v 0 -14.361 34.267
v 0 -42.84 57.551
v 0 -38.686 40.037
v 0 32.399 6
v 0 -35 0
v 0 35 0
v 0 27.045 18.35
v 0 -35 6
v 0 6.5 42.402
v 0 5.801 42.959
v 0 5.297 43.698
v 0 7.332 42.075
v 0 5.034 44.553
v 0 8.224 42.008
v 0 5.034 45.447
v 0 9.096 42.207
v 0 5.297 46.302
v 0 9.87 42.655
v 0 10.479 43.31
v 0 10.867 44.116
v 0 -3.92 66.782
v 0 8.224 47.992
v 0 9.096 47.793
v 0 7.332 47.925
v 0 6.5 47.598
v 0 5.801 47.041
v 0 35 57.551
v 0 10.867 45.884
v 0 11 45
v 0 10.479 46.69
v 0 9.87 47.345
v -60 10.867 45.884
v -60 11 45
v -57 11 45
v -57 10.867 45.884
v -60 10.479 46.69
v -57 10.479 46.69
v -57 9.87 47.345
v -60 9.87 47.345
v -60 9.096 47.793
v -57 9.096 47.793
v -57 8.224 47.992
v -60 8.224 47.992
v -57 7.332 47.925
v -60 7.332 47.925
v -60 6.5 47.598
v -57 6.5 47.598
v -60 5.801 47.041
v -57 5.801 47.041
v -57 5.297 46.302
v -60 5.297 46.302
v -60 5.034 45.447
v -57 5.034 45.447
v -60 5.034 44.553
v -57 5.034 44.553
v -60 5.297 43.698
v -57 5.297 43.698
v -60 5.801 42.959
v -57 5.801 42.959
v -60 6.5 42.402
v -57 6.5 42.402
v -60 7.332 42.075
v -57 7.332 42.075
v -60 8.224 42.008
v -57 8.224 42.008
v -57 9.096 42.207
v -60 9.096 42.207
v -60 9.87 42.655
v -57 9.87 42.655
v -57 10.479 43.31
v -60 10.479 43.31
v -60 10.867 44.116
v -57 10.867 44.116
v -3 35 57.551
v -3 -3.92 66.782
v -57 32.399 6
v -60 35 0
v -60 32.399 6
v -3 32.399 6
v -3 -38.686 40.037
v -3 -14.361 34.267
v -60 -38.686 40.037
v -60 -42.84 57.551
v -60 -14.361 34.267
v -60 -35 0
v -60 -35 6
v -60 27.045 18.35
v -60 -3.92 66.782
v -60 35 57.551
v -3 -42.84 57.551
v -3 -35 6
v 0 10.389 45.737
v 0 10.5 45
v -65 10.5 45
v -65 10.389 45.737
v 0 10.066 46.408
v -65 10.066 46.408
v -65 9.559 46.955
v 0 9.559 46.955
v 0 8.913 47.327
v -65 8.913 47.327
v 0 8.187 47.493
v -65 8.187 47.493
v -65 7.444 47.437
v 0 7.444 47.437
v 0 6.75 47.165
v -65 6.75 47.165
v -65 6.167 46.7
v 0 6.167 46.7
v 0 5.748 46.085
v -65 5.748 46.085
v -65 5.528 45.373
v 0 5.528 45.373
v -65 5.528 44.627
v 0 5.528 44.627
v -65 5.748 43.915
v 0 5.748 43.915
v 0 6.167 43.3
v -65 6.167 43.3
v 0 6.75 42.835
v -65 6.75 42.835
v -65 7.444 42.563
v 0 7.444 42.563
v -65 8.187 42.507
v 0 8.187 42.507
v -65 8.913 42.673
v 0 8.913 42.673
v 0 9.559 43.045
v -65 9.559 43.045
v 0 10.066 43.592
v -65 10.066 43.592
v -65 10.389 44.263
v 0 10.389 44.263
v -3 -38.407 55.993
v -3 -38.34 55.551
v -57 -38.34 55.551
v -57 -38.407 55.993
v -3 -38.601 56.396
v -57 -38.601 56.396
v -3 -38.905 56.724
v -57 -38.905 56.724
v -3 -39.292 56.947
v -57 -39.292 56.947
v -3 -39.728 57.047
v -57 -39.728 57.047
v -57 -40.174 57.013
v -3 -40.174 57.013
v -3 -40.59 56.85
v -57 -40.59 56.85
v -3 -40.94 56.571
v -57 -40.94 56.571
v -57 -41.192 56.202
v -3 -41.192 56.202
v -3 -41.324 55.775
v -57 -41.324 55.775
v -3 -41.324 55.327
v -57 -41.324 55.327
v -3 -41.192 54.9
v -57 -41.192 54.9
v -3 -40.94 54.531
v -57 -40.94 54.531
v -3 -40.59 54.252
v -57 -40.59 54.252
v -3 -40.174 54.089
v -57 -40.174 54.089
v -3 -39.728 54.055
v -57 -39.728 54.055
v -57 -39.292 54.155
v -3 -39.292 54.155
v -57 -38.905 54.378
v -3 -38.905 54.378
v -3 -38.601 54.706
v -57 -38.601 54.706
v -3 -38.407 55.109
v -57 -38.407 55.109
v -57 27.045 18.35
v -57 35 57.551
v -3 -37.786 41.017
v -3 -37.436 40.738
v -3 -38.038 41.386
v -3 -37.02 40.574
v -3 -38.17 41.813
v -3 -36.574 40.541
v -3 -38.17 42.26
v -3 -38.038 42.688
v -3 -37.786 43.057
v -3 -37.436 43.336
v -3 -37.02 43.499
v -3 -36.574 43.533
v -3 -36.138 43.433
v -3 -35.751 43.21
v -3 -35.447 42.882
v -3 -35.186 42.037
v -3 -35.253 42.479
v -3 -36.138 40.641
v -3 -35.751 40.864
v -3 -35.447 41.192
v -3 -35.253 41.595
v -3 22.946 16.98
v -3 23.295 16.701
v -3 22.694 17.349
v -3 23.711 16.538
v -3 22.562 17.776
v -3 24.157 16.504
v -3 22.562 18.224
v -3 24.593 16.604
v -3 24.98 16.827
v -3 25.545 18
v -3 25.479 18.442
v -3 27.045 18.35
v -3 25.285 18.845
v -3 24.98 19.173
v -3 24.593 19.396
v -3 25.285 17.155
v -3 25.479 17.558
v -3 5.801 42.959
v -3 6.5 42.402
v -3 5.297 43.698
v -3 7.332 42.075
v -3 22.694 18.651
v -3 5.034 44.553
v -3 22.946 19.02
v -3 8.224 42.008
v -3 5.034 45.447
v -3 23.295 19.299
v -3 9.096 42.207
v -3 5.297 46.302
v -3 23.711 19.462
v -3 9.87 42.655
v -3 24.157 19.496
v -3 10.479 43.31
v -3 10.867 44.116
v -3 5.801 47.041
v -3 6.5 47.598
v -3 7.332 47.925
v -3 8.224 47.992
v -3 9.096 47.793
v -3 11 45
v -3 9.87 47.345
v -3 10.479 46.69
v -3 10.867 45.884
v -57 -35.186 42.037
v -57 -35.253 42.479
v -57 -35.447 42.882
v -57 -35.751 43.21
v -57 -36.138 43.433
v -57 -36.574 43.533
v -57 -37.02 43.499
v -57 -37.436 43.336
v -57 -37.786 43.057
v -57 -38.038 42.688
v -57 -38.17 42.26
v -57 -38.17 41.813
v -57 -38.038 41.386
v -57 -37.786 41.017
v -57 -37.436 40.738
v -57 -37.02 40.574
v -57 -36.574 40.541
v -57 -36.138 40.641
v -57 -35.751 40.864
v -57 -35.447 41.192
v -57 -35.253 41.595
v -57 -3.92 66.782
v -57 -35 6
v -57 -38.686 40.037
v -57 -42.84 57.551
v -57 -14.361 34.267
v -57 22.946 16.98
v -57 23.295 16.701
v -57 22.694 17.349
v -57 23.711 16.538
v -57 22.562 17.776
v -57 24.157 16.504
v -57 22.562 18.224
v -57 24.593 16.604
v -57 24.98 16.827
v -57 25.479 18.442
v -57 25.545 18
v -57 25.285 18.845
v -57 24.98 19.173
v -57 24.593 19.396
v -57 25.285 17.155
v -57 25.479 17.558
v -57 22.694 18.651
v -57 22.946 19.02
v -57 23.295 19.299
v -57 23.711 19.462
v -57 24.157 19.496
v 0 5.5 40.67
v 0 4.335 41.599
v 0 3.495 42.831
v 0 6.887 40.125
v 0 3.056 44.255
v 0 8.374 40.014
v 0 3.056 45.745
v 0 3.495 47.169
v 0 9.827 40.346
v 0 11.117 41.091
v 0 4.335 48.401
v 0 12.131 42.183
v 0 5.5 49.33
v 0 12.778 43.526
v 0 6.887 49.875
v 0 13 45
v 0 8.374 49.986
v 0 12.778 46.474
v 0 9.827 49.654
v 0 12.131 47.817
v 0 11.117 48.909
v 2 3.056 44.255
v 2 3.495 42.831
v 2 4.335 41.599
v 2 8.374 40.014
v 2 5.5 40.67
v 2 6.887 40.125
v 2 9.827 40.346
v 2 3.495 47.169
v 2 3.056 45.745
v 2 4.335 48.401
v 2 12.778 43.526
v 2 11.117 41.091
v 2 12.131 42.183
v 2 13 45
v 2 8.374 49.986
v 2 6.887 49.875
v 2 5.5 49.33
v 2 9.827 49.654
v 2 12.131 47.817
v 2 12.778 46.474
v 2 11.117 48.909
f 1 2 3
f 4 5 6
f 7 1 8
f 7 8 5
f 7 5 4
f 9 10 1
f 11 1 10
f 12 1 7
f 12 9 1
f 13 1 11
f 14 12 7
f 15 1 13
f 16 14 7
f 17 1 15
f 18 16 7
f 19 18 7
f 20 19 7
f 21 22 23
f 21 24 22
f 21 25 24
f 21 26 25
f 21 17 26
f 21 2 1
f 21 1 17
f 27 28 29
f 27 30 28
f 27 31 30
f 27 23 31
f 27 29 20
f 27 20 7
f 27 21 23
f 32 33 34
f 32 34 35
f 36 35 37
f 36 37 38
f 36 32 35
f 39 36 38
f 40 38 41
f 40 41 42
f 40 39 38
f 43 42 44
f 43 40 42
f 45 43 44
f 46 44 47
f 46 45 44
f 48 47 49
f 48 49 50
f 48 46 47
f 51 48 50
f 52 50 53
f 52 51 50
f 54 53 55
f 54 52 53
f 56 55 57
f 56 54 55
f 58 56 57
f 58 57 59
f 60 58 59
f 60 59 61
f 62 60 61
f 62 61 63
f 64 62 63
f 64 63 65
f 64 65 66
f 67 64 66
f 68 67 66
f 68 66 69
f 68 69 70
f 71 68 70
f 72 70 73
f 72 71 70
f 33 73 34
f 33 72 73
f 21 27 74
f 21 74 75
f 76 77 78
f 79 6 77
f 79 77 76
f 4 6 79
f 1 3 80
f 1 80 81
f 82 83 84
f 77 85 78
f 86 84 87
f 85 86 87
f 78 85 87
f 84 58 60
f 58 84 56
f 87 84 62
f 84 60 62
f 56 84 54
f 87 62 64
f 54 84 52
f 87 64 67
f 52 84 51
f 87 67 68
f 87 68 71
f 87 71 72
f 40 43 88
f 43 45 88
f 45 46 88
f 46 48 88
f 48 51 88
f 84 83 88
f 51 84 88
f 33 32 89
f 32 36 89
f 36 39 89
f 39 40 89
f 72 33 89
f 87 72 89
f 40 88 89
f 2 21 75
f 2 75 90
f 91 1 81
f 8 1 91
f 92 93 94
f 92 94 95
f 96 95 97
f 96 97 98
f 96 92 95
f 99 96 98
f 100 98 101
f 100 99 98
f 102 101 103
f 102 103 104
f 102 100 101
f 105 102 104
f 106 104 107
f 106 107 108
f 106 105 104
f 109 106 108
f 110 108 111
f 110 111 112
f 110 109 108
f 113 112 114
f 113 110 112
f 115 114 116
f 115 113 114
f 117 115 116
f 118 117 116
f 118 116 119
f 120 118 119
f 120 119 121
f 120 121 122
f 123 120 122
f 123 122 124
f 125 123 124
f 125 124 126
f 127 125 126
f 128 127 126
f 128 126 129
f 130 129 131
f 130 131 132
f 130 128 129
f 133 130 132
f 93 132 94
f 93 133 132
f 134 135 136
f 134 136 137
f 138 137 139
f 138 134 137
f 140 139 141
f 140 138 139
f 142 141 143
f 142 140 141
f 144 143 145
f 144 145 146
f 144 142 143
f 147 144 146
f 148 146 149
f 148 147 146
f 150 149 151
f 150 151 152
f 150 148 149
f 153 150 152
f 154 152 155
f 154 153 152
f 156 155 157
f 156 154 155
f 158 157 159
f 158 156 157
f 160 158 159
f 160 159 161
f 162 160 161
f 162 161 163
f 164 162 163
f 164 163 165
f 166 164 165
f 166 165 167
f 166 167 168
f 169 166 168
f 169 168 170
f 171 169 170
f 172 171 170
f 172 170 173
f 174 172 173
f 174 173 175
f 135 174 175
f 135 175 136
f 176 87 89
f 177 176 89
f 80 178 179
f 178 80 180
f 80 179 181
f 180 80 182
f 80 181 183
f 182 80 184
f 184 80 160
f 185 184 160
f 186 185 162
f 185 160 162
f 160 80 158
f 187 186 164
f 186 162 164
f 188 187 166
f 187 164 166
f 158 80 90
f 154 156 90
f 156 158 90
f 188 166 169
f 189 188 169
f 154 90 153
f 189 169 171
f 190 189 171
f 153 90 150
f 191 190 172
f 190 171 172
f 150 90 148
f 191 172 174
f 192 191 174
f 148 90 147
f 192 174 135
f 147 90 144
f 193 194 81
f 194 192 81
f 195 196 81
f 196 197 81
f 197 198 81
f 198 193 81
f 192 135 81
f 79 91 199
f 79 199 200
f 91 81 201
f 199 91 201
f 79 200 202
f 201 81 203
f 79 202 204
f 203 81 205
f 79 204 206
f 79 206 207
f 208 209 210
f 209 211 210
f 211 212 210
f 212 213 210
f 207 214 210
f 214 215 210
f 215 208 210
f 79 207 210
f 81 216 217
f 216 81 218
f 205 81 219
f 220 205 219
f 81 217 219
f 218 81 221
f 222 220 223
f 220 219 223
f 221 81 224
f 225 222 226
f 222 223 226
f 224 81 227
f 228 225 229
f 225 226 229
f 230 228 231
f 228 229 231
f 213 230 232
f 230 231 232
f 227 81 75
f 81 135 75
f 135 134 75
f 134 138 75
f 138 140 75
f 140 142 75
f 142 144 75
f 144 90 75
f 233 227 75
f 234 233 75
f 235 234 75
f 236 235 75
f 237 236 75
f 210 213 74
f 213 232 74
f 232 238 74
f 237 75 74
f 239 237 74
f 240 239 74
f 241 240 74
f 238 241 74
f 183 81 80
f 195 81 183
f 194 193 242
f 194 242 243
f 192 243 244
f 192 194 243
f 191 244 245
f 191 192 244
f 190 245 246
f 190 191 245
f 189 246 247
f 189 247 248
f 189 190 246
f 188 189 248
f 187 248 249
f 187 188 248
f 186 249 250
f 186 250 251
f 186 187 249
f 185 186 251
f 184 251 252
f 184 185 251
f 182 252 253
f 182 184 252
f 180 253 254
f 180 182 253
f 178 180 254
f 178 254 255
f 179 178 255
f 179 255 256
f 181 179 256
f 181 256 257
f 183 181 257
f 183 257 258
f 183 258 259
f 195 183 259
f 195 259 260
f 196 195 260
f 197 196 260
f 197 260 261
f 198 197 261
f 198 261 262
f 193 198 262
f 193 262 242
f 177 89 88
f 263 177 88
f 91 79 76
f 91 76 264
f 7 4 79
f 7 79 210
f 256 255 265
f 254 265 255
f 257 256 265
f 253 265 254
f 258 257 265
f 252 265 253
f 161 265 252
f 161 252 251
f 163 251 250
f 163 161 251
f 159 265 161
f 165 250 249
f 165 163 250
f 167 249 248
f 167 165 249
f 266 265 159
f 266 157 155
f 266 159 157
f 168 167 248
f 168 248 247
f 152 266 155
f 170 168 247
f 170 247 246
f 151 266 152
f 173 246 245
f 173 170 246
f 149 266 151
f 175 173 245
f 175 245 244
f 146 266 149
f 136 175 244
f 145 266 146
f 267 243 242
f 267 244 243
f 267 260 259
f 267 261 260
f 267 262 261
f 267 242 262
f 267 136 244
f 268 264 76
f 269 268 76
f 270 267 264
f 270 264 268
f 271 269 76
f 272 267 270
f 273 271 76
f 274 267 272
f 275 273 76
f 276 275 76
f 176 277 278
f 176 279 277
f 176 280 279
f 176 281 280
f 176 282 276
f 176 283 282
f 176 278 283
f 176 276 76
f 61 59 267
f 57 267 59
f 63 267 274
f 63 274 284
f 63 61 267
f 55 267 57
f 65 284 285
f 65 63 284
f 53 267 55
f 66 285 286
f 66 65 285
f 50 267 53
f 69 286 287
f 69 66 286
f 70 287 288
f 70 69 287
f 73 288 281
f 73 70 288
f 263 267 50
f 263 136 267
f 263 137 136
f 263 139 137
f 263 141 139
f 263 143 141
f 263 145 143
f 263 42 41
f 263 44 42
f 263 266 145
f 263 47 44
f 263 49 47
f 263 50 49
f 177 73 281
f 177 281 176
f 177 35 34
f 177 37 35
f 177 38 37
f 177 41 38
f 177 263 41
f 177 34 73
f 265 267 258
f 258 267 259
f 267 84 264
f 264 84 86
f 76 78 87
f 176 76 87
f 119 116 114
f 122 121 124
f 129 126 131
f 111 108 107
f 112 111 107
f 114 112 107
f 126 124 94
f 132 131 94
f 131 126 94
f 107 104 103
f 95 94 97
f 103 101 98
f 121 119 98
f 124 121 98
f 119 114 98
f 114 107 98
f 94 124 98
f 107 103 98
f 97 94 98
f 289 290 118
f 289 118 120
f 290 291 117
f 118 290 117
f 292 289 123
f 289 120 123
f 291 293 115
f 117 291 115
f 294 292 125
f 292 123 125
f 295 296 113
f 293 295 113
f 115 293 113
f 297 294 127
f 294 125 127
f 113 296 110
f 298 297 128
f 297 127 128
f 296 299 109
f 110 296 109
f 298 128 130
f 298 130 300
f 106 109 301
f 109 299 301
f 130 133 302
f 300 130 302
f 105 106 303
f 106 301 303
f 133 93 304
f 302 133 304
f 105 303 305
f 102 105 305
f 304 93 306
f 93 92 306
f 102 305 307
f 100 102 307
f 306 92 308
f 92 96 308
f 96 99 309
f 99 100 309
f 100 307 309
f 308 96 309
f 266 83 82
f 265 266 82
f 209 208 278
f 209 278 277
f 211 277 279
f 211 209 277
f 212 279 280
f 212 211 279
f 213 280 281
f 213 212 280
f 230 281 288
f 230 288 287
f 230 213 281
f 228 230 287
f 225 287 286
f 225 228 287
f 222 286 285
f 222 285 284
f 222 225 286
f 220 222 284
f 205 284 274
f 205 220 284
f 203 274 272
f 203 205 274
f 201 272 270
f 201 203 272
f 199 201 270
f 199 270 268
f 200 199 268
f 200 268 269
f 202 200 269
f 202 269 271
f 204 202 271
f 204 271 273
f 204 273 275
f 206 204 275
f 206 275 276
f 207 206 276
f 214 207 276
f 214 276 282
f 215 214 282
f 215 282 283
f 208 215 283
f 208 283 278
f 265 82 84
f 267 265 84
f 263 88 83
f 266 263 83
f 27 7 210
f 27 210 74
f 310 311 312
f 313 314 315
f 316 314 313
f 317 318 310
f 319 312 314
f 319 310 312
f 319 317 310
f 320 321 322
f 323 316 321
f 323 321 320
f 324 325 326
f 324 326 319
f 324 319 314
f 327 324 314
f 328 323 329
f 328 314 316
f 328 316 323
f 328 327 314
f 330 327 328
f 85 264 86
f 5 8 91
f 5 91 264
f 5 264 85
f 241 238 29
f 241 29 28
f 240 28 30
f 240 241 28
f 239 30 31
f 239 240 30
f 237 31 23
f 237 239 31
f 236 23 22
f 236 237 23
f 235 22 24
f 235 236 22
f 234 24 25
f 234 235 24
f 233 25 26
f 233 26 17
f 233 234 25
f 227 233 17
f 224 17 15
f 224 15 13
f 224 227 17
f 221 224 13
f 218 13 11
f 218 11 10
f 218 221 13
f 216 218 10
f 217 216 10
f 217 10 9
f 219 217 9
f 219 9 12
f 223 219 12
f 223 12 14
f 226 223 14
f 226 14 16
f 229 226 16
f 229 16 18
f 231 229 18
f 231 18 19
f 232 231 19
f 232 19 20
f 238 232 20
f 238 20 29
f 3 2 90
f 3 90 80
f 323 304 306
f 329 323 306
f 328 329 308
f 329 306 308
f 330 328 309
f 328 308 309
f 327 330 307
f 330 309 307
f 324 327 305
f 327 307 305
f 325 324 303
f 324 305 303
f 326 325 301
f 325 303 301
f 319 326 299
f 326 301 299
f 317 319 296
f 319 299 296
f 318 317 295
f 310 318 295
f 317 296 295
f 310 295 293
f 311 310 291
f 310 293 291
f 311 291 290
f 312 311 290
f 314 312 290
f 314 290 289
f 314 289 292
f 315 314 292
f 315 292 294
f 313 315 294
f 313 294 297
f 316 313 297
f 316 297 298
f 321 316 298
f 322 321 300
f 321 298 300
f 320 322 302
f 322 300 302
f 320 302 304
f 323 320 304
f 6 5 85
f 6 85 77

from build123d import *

# Parameters (mm, degrees)
F1_DEPTH  = 60
F2_DEPTH  = 3
F4_R      = 3
F5_DEPTH  = 3
F6_DEPTH  = 60
F7_R      = 1.5
F8_DEPTH  = 60
F9_R      = 1.5
F10_DEPTH = 60
F11_R     = 2.5
F12_DEPTH = 65
F11_R_2   = 5
F13_DEPTH = 2


with BuildPart() as f1:
    # F0 (on Right) → F1 (new body)
    with BuildSketch(Plane.YZ):
        Polygon((-35, 6), (-35, 0), (35, 0), (32.3989484852, 6), align=None)
    extrude(amount=-F1_DEPTH)

    # F0 (on Right) → F2 (join)
    with BuildSketch(Plane.YZ):
        Polygon((-14.361242862, 34.2673257278), (-35, 6), (32.3989484852, 6), (27.0451438645, 18.3499390697), (35, 57.5509628301), (-3.9202245884, 66.7822204902), (-42.8404491768, 57.5509628301), (-38.6863832298, 40.0368617653), align=None)
    extrude(amount=-F2_DEPTH)

    # F4 (on offset) → F5 (join)
    with BuildSketch(Plane.YZ.offset(-60)):
        Polygon((-38.6863832298, 40.0368617653), (-14.361242862, 34.2673257278), (-35, 6), (32.3989484852, 6), (27.0451438645, 18.3499390697), (35, 57.5509628301), (-3.9202245884, 66.7822204902), (-42.8404491768, 57.5509628301), align=None)
        with Locations((8, 45)):
            Circle(F4_R, mode=Mode.SUBTRACT)
    extrude(amount=F5_DEPTH)

    # F4 (on offset) → F6 (cut)
    with BuildSketch(Plane.YZ.offset(-60)):
        with Locations((8, 45)):
            Circle(F4_R)
    extrude(amount=F6_DEPTH, mode=Mode.SUBTRACT)

    # F7 (on Right) → F8 (join)
    with BuildSketch(Plane.YZ):
        with Locations((-39.8404491768, 55.5509628301)):
            Circle(F7_R)
        with Locations((-36.6863832298, 42.0368617653)):
            Circle(F7_R)
    extrude(amount=-F8_DEPTH)

    # F9 (on Right) → F10 (join)
    with BuildSketch(Plane.YZ):
        with Locations((24.0451438645, 18)):
            Circle(F9_R)
    extrude(amount=-F10_DEPTH)


with BuildPart() as f12:
    # F11 (on Right) → F12 (new body)
    with BuildSketch(Plane.YZ):
        with Locations((8, 45)):
            Circle(F11_R)
    extrude(amount=-F12_DEPTH)

    # F11 (on Right) → F13 (join)
    with BuildSketch(Plane.YZ):
        with Locations((8, 45)):
            Circle(F11_R_2)
        with Locations((8, 45)):
            Circle(F11_R, mode=Mode.SUBTRACT)
        with Locations((8, 45)):
            Circle(F11_R)
    extrude(amount=F13_DEPTH)


solid = Compound([f1.part, f12.part])
